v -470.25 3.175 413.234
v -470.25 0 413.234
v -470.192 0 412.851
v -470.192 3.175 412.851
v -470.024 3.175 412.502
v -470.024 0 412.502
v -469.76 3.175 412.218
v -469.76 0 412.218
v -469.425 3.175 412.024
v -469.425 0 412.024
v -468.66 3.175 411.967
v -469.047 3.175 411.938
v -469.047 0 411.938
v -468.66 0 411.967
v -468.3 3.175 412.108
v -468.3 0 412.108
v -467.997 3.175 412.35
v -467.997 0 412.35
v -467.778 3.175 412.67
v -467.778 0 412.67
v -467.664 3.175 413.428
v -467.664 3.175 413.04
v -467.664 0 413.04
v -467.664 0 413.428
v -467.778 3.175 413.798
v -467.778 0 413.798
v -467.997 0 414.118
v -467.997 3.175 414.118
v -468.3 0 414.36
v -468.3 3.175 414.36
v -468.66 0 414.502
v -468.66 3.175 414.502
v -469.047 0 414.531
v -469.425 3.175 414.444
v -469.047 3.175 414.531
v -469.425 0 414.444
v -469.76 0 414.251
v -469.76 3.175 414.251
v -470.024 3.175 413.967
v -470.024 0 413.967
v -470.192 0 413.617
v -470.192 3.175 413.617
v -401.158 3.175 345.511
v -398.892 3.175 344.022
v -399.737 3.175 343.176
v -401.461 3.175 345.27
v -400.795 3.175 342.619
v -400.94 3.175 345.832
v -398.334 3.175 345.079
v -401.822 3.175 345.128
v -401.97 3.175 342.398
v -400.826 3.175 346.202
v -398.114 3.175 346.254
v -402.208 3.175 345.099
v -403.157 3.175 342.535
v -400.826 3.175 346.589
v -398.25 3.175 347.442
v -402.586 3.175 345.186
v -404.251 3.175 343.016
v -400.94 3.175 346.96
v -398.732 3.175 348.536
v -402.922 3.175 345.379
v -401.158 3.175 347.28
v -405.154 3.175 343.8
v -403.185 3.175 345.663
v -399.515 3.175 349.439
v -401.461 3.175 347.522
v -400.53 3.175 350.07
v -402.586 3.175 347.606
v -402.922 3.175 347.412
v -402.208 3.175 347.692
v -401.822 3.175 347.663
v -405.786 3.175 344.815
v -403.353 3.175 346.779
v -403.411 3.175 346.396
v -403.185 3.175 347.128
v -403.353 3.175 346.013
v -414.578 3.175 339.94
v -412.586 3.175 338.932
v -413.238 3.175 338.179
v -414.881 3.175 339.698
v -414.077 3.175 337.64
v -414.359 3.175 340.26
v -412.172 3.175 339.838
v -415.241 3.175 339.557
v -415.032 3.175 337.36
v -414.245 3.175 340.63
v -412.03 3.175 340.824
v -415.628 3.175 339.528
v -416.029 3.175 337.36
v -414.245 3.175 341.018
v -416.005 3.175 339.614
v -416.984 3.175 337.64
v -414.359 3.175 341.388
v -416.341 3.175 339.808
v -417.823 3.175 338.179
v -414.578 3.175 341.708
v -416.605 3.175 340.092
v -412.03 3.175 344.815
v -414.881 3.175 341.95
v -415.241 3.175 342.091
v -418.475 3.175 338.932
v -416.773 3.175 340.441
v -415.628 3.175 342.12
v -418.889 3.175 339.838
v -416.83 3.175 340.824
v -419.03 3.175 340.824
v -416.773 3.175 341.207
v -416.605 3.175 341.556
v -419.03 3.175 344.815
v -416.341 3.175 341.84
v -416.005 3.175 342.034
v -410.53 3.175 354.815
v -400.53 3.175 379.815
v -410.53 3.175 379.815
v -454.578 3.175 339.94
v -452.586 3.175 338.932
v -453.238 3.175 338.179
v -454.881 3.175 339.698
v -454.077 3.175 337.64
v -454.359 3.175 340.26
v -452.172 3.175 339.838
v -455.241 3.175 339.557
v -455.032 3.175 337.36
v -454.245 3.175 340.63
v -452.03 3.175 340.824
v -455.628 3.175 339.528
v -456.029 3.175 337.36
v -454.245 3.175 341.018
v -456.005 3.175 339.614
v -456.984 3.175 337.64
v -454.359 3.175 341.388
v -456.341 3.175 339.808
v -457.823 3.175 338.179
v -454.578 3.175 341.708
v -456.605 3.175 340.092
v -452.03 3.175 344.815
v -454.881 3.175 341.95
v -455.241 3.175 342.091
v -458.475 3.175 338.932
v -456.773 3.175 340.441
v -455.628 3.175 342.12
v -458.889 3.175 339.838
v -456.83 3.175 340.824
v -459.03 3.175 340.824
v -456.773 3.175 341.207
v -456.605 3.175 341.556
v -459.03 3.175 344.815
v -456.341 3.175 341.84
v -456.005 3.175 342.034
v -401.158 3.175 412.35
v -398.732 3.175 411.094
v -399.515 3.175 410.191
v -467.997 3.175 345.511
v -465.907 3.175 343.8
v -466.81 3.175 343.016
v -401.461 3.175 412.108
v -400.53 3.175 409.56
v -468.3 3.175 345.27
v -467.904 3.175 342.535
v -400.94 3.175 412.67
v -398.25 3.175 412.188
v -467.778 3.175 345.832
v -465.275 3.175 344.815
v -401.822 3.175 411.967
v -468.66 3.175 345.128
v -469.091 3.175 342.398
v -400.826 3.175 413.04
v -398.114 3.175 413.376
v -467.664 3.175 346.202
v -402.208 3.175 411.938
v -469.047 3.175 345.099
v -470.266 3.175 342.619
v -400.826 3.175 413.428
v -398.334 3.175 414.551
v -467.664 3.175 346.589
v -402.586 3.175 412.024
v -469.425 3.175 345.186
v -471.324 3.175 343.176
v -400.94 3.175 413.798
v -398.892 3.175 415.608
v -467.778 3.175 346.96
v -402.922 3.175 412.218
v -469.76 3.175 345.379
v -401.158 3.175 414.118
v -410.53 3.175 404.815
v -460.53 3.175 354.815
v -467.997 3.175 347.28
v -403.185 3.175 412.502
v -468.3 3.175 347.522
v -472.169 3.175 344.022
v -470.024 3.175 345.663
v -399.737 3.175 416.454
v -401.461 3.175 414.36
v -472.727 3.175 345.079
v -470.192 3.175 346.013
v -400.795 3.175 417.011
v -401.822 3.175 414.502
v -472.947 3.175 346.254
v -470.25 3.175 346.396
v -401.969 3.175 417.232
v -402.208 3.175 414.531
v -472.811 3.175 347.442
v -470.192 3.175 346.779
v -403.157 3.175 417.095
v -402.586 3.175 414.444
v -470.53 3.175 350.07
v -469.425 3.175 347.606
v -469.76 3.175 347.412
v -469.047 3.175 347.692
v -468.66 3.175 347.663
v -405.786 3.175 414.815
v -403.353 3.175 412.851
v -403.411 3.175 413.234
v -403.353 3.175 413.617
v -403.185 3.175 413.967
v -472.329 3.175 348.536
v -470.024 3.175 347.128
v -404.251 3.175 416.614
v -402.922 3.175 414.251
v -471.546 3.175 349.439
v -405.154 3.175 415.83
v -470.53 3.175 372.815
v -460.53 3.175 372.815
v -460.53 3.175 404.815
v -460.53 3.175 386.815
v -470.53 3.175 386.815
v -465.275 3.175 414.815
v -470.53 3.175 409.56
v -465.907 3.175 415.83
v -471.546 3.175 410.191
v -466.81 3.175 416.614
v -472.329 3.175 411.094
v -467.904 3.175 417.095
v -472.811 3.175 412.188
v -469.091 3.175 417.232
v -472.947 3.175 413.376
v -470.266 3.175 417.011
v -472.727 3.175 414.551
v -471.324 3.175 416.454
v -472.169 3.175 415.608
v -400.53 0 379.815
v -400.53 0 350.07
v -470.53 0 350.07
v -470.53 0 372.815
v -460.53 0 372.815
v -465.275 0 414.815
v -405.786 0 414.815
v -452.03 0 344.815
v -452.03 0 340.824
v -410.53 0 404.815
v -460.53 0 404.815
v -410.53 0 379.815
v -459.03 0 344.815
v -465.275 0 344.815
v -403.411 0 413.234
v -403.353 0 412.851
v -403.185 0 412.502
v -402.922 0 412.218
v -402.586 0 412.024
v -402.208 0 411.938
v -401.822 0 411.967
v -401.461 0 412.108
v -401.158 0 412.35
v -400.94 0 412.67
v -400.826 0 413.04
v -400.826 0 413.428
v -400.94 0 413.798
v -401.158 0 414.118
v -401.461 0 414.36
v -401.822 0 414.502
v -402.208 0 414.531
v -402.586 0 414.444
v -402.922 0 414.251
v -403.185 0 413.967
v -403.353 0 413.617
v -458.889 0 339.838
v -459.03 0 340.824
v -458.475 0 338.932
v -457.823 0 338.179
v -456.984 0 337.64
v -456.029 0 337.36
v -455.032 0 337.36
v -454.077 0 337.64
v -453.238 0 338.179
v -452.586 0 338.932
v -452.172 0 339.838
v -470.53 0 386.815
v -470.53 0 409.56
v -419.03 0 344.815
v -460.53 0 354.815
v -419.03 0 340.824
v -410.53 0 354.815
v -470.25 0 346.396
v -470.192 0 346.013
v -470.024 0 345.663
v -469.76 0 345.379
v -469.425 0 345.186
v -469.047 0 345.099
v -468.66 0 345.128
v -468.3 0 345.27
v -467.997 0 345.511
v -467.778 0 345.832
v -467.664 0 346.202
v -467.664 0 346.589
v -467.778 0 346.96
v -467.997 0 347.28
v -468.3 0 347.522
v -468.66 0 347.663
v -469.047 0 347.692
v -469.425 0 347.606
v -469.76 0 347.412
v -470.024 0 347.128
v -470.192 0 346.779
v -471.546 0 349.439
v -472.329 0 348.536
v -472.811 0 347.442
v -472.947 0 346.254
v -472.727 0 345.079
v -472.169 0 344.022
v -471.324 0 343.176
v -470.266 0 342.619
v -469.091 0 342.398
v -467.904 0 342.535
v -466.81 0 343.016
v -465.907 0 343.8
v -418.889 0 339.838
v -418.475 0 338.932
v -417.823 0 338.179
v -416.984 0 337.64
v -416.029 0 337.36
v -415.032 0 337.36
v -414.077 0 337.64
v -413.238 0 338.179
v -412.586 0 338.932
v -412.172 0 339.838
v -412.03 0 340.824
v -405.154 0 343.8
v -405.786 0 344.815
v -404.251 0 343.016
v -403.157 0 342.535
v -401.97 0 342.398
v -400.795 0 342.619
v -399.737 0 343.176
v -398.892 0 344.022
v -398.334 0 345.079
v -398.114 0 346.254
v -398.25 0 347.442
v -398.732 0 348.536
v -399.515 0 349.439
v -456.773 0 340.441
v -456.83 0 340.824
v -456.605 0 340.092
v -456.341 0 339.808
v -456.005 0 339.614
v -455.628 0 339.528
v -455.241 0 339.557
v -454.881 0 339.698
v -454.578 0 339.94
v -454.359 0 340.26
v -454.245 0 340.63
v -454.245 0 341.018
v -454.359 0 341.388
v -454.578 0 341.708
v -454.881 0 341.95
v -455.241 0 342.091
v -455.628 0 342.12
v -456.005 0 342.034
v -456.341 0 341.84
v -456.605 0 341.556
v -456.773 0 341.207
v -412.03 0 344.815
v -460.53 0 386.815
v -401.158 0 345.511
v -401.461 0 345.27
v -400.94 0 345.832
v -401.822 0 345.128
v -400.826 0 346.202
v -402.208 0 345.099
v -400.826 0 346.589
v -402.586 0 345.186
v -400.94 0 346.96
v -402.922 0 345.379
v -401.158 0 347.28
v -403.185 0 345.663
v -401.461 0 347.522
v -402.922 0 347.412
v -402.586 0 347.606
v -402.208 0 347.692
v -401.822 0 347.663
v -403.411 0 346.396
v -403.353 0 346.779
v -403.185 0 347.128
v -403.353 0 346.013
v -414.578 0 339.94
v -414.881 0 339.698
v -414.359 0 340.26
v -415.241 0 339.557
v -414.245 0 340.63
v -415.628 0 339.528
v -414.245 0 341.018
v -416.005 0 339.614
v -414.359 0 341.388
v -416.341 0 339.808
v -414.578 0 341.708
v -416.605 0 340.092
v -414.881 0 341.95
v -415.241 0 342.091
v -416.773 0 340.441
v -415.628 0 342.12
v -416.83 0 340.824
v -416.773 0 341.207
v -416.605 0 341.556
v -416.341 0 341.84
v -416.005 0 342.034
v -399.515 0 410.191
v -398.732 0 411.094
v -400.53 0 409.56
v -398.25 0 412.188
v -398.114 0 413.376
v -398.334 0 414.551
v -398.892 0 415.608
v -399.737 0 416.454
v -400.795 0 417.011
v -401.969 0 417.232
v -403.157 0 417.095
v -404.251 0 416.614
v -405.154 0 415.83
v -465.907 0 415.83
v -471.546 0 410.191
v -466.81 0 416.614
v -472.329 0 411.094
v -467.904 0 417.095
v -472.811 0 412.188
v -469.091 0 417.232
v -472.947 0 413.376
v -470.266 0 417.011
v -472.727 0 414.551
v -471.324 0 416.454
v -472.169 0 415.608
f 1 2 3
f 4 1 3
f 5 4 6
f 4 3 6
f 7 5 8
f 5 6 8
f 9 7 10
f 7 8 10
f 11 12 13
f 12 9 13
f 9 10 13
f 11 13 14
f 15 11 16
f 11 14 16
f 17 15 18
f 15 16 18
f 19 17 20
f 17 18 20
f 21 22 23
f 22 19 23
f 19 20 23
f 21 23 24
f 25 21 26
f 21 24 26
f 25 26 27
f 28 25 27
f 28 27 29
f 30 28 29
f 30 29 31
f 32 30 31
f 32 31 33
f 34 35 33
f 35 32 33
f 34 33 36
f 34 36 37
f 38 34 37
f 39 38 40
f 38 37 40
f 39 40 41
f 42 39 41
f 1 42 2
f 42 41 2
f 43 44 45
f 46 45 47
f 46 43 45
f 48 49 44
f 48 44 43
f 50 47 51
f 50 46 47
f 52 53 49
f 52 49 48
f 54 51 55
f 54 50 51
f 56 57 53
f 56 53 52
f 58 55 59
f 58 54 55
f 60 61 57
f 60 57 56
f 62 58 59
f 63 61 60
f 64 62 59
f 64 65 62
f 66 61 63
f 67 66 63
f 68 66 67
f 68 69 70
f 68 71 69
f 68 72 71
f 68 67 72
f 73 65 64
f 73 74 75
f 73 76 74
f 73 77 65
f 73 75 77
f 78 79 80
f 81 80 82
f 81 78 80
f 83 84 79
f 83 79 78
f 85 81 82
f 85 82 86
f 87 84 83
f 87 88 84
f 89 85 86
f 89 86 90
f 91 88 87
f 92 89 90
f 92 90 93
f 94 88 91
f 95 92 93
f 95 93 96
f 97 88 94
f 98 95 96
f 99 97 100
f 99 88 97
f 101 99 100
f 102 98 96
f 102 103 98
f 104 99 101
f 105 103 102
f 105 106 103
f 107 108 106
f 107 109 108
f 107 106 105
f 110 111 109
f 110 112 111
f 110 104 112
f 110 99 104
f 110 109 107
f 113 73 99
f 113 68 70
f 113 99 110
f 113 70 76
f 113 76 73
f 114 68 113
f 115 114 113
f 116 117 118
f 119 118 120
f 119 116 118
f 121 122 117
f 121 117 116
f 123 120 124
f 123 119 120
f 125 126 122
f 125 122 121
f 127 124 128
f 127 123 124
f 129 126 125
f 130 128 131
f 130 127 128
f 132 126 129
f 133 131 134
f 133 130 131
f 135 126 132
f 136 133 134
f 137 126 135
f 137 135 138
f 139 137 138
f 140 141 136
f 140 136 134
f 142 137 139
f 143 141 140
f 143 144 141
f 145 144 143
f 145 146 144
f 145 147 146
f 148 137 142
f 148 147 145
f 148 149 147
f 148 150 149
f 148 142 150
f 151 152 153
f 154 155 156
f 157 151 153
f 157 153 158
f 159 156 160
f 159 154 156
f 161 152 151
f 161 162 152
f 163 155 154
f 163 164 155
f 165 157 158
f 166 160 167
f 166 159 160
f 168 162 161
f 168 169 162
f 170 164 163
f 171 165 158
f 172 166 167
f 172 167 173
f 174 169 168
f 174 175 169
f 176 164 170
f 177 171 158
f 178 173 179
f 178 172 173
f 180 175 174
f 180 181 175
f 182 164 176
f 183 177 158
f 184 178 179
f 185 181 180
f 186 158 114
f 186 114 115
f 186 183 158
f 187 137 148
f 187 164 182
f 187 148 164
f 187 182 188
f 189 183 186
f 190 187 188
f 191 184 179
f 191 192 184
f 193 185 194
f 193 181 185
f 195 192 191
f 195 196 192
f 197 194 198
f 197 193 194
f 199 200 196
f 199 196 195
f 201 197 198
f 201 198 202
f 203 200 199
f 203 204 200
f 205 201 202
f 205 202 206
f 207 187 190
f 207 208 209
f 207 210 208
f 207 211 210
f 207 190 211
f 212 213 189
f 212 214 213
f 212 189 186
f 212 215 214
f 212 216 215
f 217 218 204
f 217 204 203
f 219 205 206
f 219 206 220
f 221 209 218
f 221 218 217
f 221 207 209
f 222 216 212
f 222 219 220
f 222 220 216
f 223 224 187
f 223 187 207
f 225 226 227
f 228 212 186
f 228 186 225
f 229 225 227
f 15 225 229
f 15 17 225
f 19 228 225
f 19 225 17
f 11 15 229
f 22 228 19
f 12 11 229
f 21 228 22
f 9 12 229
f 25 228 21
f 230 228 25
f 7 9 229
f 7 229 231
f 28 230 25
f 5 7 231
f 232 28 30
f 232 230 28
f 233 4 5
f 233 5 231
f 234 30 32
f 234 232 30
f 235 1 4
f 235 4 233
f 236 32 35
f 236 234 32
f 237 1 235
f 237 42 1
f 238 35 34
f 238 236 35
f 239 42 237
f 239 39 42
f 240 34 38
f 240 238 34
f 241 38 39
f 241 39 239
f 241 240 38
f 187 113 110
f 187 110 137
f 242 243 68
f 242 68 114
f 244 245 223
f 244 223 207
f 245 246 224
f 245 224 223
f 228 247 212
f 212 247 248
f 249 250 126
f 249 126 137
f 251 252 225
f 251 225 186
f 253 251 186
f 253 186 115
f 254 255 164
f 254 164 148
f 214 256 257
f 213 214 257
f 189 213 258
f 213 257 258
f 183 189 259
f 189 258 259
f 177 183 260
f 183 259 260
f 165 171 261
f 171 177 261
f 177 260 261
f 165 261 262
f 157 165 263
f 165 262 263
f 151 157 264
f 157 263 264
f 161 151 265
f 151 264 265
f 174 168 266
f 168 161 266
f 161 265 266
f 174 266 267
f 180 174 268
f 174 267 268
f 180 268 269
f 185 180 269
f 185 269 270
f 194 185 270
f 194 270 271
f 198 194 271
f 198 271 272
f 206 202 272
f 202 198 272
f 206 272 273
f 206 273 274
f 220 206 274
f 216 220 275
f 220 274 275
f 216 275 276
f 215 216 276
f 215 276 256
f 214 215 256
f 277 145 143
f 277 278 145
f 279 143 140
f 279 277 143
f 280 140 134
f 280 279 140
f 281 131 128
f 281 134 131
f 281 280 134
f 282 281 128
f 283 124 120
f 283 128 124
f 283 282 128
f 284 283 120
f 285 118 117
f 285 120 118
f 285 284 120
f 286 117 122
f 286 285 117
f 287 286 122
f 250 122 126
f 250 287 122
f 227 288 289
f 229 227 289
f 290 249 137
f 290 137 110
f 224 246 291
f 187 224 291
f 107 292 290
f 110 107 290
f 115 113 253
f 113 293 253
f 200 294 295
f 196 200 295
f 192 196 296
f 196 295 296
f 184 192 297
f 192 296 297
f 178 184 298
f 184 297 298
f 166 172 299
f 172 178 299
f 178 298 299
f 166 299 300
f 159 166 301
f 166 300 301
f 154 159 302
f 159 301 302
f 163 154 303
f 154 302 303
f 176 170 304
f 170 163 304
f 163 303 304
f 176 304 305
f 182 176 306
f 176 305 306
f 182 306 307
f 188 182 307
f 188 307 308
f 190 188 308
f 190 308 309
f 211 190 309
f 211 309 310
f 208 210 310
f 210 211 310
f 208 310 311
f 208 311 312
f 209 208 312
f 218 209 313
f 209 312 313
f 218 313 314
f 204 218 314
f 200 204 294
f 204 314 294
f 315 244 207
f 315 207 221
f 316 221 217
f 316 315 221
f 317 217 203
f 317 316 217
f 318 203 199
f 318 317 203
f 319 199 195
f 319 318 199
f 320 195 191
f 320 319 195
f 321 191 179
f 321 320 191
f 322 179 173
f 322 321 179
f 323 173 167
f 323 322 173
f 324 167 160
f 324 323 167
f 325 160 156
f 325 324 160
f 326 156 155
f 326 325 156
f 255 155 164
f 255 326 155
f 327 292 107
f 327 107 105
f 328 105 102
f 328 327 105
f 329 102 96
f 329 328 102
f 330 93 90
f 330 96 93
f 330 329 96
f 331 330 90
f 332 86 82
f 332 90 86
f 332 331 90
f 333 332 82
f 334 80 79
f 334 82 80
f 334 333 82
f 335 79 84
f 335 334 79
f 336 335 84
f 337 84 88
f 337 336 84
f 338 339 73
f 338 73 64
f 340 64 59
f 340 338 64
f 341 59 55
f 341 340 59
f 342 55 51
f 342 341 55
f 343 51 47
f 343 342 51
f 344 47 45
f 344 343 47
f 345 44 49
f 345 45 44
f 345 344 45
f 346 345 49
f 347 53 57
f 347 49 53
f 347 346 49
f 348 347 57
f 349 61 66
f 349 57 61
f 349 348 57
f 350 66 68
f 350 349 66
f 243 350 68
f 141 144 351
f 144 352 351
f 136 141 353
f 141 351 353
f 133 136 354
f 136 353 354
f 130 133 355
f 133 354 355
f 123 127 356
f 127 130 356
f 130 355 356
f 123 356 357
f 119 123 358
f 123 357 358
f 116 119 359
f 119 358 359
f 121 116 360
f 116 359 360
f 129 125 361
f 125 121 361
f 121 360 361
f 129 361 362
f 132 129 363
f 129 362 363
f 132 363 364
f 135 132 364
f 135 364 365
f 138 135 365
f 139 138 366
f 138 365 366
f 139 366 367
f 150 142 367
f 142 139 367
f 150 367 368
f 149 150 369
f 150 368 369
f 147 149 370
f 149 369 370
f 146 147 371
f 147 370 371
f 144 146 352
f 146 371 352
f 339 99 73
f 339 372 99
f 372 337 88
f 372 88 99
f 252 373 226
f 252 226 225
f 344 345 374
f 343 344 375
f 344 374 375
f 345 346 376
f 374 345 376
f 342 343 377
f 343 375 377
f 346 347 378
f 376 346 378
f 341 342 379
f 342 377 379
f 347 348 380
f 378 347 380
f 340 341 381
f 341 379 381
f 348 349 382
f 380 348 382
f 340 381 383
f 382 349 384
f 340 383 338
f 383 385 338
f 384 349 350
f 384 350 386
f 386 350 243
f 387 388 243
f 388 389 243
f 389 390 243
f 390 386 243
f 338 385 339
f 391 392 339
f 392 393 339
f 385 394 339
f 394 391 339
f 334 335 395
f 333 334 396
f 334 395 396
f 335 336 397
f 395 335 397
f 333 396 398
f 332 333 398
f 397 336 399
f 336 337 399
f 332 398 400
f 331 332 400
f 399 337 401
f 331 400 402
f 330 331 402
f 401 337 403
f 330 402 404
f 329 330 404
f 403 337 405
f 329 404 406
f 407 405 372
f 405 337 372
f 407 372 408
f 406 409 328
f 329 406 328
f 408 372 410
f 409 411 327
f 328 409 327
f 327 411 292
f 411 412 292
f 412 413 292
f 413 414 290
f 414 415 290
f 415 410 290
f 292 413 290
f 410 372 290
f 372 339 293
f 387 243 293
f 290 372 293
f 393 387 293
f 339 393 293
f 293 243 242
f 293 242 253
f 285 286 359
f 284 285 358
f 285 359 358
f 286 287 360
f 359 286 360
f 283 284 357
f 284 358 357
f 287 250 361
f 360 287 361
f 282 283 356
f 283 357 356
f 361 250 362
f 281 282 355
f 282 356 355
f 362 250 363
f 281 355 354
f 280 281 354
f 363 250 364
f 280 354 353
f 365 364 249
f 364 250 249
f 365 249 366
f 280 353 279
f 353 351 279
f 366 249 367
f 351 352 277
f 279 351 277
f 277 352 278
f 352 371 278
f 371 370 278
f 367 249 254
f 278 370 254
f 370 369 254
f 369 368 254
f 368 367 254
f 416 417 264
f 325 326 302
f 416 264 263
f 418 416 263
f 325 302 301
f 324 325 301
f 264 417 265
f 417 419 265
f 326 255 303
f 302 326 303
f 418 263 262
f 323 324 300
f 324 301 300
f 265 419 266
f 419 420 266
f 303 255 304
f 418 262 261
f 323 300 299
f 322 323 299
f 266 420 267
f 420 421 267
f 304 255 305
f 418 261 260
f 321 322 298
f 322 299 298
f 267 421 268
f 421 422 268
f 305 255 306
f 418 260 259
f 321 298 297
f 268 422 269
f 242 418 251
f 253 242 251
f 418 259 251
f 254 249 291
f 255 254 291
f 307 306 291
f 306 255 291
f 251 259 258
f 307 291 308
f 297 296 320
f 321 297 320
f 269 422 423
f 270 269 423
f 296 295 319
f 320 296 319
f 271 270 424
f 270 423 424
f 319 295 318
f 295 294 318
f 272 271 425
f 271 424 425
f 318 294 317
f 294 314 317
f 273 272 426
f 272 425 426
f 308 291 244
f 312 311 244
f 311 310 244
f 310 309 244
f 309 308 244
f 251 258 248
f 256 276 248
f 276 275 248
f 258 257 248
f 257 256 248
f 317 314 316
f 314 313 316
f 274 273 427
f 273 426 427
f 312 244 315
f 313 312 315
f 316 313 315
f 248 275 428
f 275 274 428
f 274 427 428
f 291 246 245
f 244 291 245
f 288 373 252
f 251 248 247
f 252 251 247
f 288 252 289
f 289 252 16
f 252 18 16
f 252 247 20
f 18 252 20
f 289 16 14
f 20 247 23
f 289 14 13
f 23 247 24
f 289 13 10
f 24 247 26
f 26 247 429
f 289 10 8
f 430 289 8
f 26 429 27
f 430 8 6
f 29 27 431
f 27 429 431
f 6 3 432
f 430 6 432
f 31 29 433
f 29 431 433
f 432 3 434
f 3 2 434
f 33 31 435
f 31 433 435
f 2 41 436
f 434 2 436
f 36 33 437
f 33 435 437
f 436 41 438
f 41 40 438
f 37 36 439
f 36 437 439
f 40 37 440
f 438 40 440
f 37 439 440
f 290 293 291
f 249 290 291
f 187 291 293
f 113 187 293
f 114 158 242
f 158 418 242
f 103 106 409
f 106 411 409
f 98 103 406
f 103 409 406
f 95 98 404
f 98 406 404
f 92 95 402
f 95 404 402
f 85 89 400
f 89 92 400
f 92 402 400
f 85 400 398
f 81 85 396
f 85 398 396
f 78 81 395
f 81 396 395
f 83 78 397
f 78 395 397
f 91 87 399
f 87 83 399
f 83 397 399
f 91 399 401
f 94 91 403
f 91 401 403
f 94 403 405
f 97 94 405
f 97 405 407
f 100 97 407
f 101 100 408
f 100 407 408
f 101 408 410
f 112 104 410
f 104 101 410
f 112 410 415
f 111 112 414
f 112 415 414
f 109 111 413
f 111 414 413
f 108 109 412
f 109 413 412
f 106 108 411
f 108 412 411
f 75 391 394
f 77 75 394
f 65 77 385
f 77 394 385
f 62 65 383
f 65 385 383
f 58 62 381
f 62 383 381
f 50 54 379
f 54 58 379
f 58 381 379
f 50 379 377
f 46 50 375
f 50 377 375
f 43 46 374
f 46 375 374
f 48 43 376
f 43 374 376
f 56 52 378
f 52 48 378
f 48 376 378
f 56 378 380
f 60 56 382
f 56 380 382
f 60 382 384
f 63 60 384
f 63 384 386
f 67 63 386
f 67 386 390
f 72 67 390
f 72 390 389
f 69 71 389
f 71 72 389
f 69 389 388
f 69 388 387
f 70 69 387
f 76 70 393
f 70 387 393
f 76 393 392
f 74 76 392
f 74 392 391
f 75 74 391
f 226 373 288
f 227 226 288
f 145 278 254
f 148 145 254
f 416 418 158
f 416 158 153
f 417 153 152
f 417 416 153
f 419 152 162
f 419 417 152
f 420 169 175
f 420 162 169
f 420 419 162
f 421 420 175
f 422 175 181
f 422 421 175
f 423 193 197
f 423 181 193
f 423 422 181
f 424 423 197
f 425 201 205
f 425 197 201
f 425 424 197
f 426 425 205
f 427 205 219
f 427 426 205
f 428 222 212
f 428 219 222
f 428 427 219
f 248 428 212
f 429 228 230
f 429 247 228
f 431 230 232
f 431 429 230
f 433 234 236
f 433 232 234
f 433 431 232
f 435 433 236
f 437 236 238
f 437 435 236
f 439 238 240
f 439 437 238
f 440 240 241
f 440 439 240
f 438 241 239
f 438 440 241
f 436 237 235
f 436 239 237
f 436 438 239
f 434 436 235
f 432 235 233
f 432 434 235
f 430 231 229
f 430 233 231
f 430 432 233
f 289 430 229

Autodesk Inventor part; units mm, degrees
ref_plane "YZ Plane" through (0, 0, 0) normal (1, 0, 0) x (0, 1, 0)
ref_plane "XZ Plane" through (0, 0, 0) normal (0, 1, 0) x (-1, 0, 0)
ref_plane "XY Plane" through (0, 0, 0) normal (0, 0, 1) x (1, 0, 0)
sketch "Sketch1" plane through (0, 0, 0) normal (0, 1, 0) x (-1, 0, 0)
  line L0 (405.5305, 409.815) -> (465.5305, 409.815) construction
  line L1 (405.5305, 379.815) -> (405.5305, 409.815) construction
  line L2 (460.5305, 404.815) -> (410.5305, 404.815)
  line L3 (410.5305, 404.815) -> (410.5305, 379.815)
  line L4 (460.5305, 386.815) -> (470.5305, 386.815)
  line L5 (470.5305, 414.815) -> (465.2753, 414.815)
  line L6 (400.5305, 414.815) -> (400.5305, 409.5598) construction
  line L7 (465.5305, 409.815) -> (465.5305, 386.815) construction
  line L8 (460.5305, 386.815) -> (460.5305, 404.815)
  line L9 (470.5305, 386.815) -> (470.5305, 409.5598)
  line L10 (405.5305, 409.815) -> (400.5305, 414.815) construction
  line L11 (400.5305, 379.815) -> (470.5305, 379.815) construction
  line L12 (465.5305, 409.815) -> (470.5305, 414.815) construction
  arc A0 (405.7856, 414.815) -> (400.5305, 409.5598) centre (402.1112, 413.2342) ccw
  arc A1 (404.9397, 410.4058) -> (405.7856, 414.815) centre (402.1112, 413.2342) ccw construction
  line L13 (400.5305, 409.5598) -> (400.5305, 379.815)
  arc A2 (400.5305, 409.5598) -> (404.9397, 410.4058) centre (402.1112, 413.2342) ccw construction
  line L14 (405.7856, 414.815) -> (400.5305, 414.815) construction
  circle A3 centre (402.1112, 413.2342) radius 1.3
  line L15 (435.5305, 414.815) -> (435.5305, 379.815) construction
  arc A4 (465.2753, 414.815) -> (470.5305, 409.5598) centre (468.9497, 413.2342) ccw construction
  arc A5 (470.5305, 409.5598) -> (465.2753, 414.815) centre (468.9497, 413.2342) ccw
  line L16 (470.5305, 409.5598) -> (470.5305, 414.815) construction
  line L17 (465.2753, 414.815) -> (405.7856, 414.815)
  circle A6 centre (468.9497, 413.2342) radius 1.3
  line L18 (460.5305, 372.815) -> (460.5305, 354.815)
  line L19 (465.5305, 349.815) -> (465.5305, 372.815) construction
  line L20 (460.5305, 372.815) -> (470.5305, 372.815)
  line L21 (470.5305, 372.815) -> (470.5305, 350.0701)
  arc A7 (470.5305, 350.0701) -> (465.2753, 344.815) centre (468.9497, 346.3957) ccw construction
  line L22 (470.5305, 344.815) -> (465.2753, 344.815) construction
  line L23 (465.5305, 349.815) -> (470.5305, 344.815) construction
  line L24 (470.5305, 350.0701) -> (470.5305, 344.815) construction
  arc A8 (465.2753, 344.815) -> (470.5305, 350.0701) centre (468.9497, 346.3957) ccw
  circle A9 centre (468.9497, 346.3957) radius 1.3
  line L25 (400.5305, 344.815) -> (400.5305, 350.0701) construction
  circle A10 centre (402.1112, 346.3957) radius 1.3
  line L26 (405.5305, 349.815) -> (400.5305, 344.815) construction
  line L27 (405.7856, 344.815) -> (400.5305, 344.815) construction
  arc A11 (400.5305, 350.0701) -> (405.7856, 344.815) centre (402.1112, 346.3957) ccw
  line L28 (435.5305, 344.815) -> (435.5305, 379.815) construction
  line L29 (405.5305, 349.815) -> (465.5305, 349.815) construction
  line L30 (460.5305, 354.815) -> (410.5305, 354.815)
  arc A12 (405.7856, 344.815) -> (404.9397, 349.2242) centre (402.1112, 346.3957) ccw construction
  line L31 (410.5305, 354.815) -> (410.5305, 379.815)
  line L32 (405.5305, 379.815) -> (405.5305, 349.815)
  line L33 (400.5305, 350.0701) -> (400.5305, 379.815)
  arc A13 (404.9397, 349.2242) -> (400.5305, 350.0701) centre (402.1112, 346.3957) ccw construction
  circle A14 centre (415.5305, 340.824) radius 1.3
  arc A15 (412.0305, 340.824) -> (419.0305, 340.824) centre (415.5305, 340.824) ccw
  line L34 (412.0305, 340.824) -> (412.0305, 344.815)
  line L35 (419.0305, 340.824) -> (419.0305, 344.815)
  line L36 (452.0305, 340.824) -> (452.0305, 344.815)
  circle A16 centre (455.5305, 340.824) radius 1.3
  arc A17 (452.0305, 340.824) -> (459.0305, 340.824) centre (455.5305, 340.824) ccw
  line L37 (459.0305, 340.824) -> (459.0305, 344.815)
  line L38 (412.0305, 344.815) -> (405.7856, 344.815)
  line L39 (465.2753, 344.815) -> (459.0305, 344.815)
  line L40 (452.0305, 344.815) -> (419.0305, 344.815)
  point P0 (0, 0)
  point P1 (403.0305, 412.315)
  point P2 (468.0305, 412.315)
  point P3 (468.0305, 347.315)
  point P4 (403.0305, 347.315)
  dimension "d0" = 23
  dimension "d1" = 5
  dimension "d2" = 8
  dimension "d3" = 2.6
  dimension "d4" = 8
  dimension "d5" = 2.6
  dimension "d6" = 2.6
  dimension "d7" = 20
  dimension "d8" = 35
  dimension "d9" = 7
extrude "Extrusion1" add sketch "Sketch1" along normal blind 3.175
properties part number "trellisCaptiveTop"
